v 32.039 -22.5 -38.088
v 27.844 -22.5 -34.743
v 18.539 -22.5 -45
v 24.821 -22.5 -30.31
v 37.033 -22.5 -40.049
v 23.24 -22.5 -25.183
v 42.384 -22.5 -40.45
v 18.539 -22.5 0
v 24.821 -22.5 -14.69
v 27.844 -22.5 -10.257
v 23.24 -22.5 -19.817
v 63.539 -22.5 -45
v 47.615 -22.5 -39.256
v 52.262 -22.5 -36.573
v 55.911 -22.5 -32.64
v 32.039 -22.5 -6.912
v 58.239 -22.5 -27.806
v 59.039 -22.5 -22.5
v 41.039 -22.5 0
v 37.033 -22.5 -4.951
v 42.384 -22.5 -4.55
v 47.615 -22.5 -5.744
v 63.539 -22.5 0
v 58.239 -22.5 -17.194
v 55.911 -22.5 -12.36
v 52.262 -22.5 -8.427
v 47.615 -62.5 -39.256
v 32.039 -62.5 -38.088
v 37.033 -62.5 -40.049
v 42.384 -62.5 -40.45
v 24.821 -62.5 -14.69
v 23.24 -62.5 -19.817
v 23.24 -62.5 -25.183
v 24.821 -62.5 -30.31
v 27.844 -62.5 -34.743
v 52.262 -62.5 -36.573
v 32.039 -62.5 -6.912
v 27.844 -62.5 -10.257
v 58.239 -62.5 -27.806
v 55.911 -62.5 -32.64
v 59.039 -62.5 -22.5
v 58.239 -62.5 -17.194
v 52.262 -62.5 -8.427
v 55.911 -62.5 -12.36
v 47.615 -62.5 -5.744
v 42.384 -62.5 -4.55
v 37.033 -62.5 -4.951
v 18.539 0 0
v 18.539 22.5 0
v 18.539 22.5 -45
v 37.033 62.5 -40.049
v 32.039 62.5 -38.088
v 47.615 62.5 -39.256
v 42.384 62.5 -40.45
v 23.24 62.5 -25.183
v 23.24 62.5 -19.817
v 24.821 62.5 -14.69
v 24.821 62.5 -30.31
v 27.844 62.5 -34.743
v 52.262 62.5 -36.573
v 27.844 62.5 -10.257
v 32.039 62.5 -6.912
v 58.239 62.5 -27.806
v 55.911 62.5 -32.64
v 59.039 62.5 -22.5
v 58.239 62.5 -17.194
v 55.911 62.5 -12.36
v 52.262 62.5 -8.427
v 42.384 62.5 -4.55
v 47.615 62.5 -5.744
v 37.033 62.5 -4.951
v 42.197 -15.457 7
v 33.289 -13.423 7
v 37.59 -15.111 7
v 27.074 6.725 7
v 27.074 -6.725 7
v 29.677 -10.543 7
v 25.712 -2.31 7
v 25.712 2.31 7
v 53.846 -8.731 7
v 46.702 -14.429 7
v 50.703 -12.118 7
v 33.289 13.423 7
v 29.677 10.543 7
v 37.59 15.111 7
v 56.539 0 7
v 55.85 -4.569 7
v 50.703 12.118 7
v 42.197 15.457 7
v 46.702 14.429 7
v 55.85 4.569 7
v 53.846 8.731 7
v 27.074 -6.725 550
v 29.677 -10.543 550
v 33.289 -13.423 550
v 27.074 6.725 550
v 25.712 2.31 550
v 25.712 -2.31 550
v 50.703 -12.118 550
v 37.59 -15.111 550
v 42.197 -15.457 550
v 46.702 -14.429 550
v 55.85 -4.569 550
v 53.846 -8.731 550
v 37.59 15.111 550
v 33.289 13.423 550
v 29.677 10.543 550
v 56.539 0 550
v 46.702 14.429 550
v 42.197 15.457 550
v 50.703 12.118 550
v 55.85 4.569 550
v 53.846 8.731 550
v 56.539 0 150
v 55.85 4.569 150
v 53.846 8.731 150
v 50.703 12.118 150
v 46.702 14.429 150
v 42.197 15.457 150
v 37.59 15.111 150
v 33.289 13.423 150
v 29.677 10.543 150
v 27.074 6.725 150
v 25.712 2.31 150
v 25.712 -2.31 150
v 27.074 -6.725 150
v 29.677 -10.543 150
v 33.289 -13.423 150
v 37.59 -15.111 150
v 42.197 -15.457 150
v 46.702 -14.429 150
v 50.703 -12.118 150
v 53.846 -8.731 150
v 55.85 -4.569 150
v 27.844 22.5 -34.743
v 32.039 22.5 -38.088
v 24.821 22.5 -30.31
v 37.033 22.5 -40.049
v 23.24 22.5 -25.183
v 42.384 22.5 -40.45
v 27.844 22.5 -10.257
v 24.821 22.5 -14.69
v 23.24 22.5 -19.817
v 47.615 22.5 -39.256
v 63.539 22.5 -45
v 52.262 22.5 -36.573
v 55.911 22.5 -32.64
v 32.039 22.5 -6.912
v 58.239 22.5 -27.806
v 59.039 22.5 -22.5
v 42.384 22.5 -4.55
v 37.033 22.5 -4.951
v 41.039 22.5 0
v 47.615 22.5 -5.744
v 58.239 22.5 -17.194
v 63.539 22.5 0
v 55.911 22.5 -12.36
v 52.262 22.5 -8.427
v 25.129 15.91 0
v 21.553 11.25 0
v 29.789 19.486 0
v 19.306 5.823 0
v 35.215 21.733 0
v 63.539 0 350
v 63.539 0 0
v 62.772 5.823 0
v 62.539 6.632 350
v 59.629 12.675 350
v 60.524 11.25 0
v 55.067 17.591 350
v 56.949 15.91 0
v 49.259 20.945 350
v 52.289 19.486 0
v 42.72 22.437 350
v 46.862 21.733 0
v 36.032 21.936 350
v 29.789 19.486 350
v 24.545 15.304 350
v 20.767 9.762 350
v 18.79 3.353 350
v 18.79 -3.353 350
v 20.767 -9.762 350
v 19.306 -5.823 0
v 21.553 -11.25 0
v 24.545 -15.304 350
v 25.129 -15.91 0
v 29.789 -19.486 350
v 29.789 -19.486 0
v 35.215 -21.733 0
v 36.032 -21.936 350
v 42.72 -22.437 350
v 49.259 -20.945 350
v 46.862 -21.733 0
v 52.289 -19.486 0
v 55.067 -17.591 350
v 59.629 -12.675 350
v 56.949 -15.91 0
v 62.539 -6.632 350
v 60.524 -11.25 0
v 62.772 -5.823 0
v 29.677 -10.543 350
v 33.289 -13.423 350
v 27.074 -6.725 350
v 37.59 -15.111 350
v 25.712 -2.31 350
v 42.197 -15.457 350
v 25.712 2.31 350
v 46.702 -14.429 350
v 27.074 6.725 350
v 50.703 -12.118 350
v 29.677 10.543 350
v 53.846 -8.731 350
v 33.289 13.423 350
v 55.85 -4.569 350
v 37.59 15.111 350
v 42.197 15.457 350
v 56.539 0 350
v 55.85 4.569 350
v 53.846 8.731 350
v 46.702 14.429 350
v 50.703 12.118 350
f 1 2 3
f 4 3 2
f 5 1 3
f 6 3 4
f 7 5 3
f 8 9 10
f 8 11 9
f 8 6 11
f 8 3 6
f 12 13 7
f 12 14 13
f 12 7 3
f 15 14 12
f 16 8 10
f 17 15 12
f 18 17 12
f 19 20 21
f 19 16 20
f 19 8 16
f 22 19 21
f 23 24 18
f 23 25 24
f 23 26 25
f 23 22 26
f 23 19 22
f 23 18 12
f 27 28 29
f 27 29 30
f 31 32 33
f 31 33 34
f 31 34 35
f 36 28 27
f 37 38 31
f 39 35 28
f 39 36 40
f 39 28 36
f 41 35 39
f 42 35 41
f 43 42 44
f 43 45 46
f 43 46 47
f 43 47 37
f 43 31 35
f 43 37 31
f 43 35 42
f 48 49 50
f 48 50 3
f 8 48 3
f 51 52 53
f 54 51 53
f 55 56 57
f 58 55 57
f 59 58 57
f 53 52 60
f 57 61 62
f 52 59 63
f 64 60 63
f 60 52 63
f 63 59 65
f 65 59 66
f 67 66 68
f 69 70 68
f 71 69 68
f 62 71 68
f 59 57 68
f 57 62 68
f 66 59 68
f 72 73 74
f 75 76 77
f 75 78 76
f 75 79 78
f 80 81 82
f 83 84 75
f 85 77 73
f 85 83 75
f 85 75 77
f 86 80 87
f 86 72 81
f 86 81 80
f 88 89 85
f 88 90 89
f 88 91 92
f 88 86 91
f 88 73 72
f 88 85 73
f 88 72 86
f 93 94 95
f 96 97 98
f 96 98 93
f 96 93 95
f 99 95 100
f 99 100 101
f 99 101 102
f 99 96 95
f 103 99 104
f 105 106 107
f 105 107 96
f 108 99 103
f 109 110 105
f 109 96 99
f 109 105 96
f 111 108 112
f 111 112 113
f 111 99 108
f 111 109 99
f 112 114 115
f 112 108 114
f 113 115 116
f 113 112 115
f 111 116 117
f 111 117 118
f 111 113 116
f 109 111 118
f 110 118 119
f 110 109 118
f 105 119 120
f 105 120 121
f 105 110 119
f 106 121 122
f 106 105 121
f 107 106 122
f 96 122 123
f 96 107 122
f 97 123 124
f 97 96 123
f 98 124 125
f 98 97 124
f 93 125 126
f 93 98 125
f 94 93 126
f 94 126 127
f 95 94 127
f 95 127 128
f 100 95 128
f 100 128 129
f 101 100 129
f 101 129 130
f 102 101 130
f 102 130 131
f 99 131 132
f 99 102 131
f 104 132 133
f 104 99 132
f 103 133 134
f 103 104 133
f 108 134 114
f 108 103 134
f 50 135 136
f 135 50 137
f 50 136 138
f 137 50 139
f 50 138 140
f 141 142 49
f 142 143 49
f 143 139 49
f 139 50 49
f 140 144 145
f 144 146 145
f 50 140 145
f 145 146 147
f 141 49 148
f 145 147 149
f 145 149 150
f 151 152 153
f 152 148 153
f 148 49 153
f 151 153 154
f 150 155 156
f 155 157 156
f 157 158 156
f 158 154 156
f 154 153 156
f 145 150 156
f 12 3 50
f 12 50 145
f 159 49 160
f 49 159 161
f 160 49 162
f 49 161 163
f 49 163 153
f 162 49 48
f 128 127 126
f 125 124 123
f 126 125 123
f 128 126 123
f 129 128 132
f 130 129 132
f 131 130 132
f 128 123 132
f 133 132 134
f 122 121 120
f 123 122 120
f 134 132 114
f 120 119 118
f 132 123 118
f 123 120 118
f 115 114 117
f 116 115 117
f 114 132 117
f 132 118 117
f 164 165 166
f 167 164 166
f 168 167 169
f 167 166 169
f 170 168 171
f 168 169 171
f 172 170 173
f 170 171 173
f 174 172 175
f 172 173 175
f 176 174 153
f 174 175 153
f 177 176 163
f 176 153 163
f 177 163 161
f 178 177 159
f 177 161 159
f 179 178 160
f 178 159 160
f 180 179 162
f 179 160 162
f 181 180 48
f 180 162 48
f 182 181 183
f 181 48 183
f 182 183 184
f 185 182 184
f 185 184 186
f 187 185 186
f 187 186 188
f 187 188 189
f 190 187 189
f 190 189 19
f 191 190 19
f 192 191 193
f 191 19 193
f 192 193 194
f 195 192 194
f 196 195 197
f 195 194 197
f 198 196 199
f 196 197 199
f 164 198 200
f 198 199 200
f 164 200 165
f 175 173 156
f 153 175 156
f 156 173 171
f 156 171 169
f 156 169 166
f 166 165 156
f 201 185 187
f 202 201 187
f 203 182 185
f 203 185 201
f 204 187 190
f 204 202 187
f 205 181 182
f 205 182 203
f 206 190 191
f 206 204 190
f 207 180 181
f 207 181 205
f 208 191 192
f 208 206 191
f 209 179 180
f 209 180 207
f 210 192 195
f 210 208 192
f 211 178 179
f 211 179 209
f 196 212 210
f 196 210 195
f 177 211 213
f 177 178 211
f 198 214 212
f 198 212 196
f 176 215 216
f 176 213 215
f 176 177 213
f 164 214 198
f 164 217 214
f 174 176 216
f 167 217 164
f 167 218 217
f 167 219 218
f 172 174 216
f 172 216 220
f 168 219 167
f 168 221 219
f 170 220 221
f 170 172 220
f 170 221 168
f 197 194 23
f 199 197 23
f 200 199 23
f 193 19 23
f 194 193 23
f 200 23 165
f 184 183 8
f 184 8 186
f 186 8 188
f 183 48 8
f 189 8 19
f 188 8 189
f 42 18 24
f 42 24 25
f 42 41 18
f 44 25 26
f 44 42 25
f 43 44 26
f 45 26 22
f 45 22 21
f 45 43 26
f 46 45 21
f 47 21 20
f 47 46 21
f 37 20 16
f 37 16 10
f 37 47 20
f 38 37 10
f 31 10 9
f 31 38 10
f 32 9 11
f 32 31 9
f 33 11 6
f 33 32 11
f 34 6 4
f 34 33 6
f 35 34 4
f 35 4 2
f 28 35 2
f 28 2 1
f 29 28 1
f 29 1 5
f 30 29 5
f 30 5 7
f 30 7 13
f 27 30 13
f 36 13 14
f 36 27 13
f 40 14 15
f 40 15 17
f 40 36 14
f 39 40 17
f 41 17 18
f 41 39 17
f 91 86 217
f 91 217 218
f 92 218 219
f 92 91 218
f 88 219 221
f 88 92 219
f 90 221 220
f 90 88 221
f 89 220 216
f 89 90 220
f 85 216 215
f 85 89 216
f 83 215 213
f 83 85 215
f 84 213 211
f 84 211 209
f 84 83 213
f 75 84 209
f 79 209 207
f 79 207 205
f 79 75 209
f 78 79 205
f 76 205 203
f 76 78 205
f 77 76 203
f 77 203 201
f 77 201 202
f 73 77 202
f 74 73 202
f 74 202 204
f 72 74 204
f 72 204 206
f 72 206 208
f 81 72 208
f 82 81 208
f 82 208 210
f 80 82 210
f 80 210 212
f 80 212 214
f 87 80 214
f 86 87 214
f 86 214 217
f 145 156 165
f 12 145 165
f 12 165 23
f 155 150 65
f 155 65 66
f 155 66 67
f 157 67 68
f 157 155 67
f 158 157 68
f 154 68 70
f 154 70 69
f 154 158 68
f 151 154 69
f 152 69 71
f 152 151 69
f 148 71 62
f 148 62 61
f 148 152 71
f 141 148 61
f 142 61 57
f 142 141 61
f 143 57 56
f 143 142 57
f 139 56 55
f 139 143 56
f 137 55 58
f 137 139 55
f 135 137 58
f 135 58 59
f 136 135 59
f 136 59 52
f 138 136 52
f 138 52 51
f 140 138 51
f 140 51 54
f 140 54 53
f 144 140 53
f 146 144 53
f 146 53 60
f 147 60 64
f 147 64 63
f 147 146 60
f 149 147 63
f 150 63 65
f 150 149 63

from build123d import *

# Parameters (mm, degrees)
F0_R     = 22.5
F1_DEPTH = 350
F2_T     = -7
F3_R     = 15.5
F4_DEPTH = 200
F5_W     = 45
F5_H     = 45
F6_DEPTH = 45
F7_R     = 18
F8_DEPTH = 62.5


with BuildPart() as f1:
    # F0 (on Top) → F1 (new body)
    with BuildSketch(Plane.XY):
        with Locations((41.038834, 0)):
            Circle(F0_R)
    extrude(amount=F1_DEPTH)

    # F2
    f2_openings = [f1.faces().sort_by_distance(p)[0] for p in [
        (41.038834, 0, 350),
    ]]
    offset(amount=F2_T, openings=f2_openings)

    # F5 (on face) → F6 (join)
    with BuildSketch(Plane(origin=(0, 0, 0), x_dir=(1, 0, 0), z_dir=(0, 0, -1))):
        with Locations((41.038834, 0)):
            Rectangle(F5_W, F5_H)
    extrude(amount=F6_DEPTH)

    # F7 (on Front) → F8 (join, symmetric)
    with BuildSketch(Plane.XZ):
        with Locations((41.038834, -22.5)):
            Circle(F7_R)
    extrude(amount=F8_DEPTH, both=True)


with BuildPart() as f4:
    # F3 (on face) → F4 (new body, symmetric)
    with BuildSketch(Plane.XY.offset(350)):
        with Locations((41.038834, 0)):
            Circle(F3_R)
    extrude(amount=F4_DEPTH, both=True)


solid = Compound([f1.part, f4.part])
